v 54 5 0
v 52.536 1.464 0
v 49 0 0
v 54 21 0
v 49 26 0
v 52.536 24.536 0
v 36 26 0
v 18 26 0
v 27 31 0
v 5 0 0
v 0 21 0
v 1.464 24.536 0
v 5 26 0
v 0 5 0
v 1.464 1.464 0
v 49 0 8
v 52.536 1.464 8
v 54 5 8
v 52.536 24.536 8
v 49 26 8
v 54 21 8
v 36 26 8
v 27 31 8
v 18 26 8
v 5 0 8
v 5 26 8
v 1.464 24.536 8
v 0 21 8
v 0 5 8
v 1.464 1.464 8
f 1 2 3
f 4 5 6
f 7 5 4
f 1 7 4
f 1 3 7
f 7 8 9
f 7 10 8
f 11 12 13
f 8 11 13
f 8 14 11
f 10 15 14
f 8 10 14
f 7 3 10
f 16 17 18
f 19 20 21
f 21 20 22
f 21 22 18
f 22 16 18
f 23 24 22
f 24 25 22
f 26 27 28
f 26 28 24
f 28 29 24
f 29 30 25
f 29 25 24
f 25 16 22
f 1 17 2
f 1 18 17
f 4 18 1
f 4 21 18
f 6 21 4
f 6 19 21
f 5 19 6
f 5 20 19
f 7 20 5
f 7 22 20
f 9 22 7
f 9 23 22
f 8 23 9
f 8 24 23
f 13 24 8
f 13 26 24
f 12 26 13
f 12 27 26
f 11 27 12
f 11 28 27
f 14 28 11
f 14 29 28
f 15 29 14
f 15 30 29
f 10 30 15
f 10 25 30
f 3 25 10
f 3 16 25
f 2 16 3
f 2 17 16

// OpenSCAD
$fn = 32;

// ----------------------------------------------------------------------
// Ratchet pawl: 54 x 26 mm body, beak 5 mm сверху
// ----------------------------------------------------------------------

// --- parameters (mm) ---
profile_height = 8;       // extrusion height
profile_points = 15;      // points of the closed outline

profile = [[0, 5], [1.464, 1.464], [5, 0], [49, 0], [52.536, 1.464], [54, 5], [54, 21], [52.536, 24.536], [49, 26], [36, 26], [27, 31], [18, 26], [5, 26], [1.464, 24.536], [0, 21]];  // single closed polygon, 15 points, counter clockwise

// --- the one profile operation ---
linear_extrude(height = profile_height) polygon(points = profile);
